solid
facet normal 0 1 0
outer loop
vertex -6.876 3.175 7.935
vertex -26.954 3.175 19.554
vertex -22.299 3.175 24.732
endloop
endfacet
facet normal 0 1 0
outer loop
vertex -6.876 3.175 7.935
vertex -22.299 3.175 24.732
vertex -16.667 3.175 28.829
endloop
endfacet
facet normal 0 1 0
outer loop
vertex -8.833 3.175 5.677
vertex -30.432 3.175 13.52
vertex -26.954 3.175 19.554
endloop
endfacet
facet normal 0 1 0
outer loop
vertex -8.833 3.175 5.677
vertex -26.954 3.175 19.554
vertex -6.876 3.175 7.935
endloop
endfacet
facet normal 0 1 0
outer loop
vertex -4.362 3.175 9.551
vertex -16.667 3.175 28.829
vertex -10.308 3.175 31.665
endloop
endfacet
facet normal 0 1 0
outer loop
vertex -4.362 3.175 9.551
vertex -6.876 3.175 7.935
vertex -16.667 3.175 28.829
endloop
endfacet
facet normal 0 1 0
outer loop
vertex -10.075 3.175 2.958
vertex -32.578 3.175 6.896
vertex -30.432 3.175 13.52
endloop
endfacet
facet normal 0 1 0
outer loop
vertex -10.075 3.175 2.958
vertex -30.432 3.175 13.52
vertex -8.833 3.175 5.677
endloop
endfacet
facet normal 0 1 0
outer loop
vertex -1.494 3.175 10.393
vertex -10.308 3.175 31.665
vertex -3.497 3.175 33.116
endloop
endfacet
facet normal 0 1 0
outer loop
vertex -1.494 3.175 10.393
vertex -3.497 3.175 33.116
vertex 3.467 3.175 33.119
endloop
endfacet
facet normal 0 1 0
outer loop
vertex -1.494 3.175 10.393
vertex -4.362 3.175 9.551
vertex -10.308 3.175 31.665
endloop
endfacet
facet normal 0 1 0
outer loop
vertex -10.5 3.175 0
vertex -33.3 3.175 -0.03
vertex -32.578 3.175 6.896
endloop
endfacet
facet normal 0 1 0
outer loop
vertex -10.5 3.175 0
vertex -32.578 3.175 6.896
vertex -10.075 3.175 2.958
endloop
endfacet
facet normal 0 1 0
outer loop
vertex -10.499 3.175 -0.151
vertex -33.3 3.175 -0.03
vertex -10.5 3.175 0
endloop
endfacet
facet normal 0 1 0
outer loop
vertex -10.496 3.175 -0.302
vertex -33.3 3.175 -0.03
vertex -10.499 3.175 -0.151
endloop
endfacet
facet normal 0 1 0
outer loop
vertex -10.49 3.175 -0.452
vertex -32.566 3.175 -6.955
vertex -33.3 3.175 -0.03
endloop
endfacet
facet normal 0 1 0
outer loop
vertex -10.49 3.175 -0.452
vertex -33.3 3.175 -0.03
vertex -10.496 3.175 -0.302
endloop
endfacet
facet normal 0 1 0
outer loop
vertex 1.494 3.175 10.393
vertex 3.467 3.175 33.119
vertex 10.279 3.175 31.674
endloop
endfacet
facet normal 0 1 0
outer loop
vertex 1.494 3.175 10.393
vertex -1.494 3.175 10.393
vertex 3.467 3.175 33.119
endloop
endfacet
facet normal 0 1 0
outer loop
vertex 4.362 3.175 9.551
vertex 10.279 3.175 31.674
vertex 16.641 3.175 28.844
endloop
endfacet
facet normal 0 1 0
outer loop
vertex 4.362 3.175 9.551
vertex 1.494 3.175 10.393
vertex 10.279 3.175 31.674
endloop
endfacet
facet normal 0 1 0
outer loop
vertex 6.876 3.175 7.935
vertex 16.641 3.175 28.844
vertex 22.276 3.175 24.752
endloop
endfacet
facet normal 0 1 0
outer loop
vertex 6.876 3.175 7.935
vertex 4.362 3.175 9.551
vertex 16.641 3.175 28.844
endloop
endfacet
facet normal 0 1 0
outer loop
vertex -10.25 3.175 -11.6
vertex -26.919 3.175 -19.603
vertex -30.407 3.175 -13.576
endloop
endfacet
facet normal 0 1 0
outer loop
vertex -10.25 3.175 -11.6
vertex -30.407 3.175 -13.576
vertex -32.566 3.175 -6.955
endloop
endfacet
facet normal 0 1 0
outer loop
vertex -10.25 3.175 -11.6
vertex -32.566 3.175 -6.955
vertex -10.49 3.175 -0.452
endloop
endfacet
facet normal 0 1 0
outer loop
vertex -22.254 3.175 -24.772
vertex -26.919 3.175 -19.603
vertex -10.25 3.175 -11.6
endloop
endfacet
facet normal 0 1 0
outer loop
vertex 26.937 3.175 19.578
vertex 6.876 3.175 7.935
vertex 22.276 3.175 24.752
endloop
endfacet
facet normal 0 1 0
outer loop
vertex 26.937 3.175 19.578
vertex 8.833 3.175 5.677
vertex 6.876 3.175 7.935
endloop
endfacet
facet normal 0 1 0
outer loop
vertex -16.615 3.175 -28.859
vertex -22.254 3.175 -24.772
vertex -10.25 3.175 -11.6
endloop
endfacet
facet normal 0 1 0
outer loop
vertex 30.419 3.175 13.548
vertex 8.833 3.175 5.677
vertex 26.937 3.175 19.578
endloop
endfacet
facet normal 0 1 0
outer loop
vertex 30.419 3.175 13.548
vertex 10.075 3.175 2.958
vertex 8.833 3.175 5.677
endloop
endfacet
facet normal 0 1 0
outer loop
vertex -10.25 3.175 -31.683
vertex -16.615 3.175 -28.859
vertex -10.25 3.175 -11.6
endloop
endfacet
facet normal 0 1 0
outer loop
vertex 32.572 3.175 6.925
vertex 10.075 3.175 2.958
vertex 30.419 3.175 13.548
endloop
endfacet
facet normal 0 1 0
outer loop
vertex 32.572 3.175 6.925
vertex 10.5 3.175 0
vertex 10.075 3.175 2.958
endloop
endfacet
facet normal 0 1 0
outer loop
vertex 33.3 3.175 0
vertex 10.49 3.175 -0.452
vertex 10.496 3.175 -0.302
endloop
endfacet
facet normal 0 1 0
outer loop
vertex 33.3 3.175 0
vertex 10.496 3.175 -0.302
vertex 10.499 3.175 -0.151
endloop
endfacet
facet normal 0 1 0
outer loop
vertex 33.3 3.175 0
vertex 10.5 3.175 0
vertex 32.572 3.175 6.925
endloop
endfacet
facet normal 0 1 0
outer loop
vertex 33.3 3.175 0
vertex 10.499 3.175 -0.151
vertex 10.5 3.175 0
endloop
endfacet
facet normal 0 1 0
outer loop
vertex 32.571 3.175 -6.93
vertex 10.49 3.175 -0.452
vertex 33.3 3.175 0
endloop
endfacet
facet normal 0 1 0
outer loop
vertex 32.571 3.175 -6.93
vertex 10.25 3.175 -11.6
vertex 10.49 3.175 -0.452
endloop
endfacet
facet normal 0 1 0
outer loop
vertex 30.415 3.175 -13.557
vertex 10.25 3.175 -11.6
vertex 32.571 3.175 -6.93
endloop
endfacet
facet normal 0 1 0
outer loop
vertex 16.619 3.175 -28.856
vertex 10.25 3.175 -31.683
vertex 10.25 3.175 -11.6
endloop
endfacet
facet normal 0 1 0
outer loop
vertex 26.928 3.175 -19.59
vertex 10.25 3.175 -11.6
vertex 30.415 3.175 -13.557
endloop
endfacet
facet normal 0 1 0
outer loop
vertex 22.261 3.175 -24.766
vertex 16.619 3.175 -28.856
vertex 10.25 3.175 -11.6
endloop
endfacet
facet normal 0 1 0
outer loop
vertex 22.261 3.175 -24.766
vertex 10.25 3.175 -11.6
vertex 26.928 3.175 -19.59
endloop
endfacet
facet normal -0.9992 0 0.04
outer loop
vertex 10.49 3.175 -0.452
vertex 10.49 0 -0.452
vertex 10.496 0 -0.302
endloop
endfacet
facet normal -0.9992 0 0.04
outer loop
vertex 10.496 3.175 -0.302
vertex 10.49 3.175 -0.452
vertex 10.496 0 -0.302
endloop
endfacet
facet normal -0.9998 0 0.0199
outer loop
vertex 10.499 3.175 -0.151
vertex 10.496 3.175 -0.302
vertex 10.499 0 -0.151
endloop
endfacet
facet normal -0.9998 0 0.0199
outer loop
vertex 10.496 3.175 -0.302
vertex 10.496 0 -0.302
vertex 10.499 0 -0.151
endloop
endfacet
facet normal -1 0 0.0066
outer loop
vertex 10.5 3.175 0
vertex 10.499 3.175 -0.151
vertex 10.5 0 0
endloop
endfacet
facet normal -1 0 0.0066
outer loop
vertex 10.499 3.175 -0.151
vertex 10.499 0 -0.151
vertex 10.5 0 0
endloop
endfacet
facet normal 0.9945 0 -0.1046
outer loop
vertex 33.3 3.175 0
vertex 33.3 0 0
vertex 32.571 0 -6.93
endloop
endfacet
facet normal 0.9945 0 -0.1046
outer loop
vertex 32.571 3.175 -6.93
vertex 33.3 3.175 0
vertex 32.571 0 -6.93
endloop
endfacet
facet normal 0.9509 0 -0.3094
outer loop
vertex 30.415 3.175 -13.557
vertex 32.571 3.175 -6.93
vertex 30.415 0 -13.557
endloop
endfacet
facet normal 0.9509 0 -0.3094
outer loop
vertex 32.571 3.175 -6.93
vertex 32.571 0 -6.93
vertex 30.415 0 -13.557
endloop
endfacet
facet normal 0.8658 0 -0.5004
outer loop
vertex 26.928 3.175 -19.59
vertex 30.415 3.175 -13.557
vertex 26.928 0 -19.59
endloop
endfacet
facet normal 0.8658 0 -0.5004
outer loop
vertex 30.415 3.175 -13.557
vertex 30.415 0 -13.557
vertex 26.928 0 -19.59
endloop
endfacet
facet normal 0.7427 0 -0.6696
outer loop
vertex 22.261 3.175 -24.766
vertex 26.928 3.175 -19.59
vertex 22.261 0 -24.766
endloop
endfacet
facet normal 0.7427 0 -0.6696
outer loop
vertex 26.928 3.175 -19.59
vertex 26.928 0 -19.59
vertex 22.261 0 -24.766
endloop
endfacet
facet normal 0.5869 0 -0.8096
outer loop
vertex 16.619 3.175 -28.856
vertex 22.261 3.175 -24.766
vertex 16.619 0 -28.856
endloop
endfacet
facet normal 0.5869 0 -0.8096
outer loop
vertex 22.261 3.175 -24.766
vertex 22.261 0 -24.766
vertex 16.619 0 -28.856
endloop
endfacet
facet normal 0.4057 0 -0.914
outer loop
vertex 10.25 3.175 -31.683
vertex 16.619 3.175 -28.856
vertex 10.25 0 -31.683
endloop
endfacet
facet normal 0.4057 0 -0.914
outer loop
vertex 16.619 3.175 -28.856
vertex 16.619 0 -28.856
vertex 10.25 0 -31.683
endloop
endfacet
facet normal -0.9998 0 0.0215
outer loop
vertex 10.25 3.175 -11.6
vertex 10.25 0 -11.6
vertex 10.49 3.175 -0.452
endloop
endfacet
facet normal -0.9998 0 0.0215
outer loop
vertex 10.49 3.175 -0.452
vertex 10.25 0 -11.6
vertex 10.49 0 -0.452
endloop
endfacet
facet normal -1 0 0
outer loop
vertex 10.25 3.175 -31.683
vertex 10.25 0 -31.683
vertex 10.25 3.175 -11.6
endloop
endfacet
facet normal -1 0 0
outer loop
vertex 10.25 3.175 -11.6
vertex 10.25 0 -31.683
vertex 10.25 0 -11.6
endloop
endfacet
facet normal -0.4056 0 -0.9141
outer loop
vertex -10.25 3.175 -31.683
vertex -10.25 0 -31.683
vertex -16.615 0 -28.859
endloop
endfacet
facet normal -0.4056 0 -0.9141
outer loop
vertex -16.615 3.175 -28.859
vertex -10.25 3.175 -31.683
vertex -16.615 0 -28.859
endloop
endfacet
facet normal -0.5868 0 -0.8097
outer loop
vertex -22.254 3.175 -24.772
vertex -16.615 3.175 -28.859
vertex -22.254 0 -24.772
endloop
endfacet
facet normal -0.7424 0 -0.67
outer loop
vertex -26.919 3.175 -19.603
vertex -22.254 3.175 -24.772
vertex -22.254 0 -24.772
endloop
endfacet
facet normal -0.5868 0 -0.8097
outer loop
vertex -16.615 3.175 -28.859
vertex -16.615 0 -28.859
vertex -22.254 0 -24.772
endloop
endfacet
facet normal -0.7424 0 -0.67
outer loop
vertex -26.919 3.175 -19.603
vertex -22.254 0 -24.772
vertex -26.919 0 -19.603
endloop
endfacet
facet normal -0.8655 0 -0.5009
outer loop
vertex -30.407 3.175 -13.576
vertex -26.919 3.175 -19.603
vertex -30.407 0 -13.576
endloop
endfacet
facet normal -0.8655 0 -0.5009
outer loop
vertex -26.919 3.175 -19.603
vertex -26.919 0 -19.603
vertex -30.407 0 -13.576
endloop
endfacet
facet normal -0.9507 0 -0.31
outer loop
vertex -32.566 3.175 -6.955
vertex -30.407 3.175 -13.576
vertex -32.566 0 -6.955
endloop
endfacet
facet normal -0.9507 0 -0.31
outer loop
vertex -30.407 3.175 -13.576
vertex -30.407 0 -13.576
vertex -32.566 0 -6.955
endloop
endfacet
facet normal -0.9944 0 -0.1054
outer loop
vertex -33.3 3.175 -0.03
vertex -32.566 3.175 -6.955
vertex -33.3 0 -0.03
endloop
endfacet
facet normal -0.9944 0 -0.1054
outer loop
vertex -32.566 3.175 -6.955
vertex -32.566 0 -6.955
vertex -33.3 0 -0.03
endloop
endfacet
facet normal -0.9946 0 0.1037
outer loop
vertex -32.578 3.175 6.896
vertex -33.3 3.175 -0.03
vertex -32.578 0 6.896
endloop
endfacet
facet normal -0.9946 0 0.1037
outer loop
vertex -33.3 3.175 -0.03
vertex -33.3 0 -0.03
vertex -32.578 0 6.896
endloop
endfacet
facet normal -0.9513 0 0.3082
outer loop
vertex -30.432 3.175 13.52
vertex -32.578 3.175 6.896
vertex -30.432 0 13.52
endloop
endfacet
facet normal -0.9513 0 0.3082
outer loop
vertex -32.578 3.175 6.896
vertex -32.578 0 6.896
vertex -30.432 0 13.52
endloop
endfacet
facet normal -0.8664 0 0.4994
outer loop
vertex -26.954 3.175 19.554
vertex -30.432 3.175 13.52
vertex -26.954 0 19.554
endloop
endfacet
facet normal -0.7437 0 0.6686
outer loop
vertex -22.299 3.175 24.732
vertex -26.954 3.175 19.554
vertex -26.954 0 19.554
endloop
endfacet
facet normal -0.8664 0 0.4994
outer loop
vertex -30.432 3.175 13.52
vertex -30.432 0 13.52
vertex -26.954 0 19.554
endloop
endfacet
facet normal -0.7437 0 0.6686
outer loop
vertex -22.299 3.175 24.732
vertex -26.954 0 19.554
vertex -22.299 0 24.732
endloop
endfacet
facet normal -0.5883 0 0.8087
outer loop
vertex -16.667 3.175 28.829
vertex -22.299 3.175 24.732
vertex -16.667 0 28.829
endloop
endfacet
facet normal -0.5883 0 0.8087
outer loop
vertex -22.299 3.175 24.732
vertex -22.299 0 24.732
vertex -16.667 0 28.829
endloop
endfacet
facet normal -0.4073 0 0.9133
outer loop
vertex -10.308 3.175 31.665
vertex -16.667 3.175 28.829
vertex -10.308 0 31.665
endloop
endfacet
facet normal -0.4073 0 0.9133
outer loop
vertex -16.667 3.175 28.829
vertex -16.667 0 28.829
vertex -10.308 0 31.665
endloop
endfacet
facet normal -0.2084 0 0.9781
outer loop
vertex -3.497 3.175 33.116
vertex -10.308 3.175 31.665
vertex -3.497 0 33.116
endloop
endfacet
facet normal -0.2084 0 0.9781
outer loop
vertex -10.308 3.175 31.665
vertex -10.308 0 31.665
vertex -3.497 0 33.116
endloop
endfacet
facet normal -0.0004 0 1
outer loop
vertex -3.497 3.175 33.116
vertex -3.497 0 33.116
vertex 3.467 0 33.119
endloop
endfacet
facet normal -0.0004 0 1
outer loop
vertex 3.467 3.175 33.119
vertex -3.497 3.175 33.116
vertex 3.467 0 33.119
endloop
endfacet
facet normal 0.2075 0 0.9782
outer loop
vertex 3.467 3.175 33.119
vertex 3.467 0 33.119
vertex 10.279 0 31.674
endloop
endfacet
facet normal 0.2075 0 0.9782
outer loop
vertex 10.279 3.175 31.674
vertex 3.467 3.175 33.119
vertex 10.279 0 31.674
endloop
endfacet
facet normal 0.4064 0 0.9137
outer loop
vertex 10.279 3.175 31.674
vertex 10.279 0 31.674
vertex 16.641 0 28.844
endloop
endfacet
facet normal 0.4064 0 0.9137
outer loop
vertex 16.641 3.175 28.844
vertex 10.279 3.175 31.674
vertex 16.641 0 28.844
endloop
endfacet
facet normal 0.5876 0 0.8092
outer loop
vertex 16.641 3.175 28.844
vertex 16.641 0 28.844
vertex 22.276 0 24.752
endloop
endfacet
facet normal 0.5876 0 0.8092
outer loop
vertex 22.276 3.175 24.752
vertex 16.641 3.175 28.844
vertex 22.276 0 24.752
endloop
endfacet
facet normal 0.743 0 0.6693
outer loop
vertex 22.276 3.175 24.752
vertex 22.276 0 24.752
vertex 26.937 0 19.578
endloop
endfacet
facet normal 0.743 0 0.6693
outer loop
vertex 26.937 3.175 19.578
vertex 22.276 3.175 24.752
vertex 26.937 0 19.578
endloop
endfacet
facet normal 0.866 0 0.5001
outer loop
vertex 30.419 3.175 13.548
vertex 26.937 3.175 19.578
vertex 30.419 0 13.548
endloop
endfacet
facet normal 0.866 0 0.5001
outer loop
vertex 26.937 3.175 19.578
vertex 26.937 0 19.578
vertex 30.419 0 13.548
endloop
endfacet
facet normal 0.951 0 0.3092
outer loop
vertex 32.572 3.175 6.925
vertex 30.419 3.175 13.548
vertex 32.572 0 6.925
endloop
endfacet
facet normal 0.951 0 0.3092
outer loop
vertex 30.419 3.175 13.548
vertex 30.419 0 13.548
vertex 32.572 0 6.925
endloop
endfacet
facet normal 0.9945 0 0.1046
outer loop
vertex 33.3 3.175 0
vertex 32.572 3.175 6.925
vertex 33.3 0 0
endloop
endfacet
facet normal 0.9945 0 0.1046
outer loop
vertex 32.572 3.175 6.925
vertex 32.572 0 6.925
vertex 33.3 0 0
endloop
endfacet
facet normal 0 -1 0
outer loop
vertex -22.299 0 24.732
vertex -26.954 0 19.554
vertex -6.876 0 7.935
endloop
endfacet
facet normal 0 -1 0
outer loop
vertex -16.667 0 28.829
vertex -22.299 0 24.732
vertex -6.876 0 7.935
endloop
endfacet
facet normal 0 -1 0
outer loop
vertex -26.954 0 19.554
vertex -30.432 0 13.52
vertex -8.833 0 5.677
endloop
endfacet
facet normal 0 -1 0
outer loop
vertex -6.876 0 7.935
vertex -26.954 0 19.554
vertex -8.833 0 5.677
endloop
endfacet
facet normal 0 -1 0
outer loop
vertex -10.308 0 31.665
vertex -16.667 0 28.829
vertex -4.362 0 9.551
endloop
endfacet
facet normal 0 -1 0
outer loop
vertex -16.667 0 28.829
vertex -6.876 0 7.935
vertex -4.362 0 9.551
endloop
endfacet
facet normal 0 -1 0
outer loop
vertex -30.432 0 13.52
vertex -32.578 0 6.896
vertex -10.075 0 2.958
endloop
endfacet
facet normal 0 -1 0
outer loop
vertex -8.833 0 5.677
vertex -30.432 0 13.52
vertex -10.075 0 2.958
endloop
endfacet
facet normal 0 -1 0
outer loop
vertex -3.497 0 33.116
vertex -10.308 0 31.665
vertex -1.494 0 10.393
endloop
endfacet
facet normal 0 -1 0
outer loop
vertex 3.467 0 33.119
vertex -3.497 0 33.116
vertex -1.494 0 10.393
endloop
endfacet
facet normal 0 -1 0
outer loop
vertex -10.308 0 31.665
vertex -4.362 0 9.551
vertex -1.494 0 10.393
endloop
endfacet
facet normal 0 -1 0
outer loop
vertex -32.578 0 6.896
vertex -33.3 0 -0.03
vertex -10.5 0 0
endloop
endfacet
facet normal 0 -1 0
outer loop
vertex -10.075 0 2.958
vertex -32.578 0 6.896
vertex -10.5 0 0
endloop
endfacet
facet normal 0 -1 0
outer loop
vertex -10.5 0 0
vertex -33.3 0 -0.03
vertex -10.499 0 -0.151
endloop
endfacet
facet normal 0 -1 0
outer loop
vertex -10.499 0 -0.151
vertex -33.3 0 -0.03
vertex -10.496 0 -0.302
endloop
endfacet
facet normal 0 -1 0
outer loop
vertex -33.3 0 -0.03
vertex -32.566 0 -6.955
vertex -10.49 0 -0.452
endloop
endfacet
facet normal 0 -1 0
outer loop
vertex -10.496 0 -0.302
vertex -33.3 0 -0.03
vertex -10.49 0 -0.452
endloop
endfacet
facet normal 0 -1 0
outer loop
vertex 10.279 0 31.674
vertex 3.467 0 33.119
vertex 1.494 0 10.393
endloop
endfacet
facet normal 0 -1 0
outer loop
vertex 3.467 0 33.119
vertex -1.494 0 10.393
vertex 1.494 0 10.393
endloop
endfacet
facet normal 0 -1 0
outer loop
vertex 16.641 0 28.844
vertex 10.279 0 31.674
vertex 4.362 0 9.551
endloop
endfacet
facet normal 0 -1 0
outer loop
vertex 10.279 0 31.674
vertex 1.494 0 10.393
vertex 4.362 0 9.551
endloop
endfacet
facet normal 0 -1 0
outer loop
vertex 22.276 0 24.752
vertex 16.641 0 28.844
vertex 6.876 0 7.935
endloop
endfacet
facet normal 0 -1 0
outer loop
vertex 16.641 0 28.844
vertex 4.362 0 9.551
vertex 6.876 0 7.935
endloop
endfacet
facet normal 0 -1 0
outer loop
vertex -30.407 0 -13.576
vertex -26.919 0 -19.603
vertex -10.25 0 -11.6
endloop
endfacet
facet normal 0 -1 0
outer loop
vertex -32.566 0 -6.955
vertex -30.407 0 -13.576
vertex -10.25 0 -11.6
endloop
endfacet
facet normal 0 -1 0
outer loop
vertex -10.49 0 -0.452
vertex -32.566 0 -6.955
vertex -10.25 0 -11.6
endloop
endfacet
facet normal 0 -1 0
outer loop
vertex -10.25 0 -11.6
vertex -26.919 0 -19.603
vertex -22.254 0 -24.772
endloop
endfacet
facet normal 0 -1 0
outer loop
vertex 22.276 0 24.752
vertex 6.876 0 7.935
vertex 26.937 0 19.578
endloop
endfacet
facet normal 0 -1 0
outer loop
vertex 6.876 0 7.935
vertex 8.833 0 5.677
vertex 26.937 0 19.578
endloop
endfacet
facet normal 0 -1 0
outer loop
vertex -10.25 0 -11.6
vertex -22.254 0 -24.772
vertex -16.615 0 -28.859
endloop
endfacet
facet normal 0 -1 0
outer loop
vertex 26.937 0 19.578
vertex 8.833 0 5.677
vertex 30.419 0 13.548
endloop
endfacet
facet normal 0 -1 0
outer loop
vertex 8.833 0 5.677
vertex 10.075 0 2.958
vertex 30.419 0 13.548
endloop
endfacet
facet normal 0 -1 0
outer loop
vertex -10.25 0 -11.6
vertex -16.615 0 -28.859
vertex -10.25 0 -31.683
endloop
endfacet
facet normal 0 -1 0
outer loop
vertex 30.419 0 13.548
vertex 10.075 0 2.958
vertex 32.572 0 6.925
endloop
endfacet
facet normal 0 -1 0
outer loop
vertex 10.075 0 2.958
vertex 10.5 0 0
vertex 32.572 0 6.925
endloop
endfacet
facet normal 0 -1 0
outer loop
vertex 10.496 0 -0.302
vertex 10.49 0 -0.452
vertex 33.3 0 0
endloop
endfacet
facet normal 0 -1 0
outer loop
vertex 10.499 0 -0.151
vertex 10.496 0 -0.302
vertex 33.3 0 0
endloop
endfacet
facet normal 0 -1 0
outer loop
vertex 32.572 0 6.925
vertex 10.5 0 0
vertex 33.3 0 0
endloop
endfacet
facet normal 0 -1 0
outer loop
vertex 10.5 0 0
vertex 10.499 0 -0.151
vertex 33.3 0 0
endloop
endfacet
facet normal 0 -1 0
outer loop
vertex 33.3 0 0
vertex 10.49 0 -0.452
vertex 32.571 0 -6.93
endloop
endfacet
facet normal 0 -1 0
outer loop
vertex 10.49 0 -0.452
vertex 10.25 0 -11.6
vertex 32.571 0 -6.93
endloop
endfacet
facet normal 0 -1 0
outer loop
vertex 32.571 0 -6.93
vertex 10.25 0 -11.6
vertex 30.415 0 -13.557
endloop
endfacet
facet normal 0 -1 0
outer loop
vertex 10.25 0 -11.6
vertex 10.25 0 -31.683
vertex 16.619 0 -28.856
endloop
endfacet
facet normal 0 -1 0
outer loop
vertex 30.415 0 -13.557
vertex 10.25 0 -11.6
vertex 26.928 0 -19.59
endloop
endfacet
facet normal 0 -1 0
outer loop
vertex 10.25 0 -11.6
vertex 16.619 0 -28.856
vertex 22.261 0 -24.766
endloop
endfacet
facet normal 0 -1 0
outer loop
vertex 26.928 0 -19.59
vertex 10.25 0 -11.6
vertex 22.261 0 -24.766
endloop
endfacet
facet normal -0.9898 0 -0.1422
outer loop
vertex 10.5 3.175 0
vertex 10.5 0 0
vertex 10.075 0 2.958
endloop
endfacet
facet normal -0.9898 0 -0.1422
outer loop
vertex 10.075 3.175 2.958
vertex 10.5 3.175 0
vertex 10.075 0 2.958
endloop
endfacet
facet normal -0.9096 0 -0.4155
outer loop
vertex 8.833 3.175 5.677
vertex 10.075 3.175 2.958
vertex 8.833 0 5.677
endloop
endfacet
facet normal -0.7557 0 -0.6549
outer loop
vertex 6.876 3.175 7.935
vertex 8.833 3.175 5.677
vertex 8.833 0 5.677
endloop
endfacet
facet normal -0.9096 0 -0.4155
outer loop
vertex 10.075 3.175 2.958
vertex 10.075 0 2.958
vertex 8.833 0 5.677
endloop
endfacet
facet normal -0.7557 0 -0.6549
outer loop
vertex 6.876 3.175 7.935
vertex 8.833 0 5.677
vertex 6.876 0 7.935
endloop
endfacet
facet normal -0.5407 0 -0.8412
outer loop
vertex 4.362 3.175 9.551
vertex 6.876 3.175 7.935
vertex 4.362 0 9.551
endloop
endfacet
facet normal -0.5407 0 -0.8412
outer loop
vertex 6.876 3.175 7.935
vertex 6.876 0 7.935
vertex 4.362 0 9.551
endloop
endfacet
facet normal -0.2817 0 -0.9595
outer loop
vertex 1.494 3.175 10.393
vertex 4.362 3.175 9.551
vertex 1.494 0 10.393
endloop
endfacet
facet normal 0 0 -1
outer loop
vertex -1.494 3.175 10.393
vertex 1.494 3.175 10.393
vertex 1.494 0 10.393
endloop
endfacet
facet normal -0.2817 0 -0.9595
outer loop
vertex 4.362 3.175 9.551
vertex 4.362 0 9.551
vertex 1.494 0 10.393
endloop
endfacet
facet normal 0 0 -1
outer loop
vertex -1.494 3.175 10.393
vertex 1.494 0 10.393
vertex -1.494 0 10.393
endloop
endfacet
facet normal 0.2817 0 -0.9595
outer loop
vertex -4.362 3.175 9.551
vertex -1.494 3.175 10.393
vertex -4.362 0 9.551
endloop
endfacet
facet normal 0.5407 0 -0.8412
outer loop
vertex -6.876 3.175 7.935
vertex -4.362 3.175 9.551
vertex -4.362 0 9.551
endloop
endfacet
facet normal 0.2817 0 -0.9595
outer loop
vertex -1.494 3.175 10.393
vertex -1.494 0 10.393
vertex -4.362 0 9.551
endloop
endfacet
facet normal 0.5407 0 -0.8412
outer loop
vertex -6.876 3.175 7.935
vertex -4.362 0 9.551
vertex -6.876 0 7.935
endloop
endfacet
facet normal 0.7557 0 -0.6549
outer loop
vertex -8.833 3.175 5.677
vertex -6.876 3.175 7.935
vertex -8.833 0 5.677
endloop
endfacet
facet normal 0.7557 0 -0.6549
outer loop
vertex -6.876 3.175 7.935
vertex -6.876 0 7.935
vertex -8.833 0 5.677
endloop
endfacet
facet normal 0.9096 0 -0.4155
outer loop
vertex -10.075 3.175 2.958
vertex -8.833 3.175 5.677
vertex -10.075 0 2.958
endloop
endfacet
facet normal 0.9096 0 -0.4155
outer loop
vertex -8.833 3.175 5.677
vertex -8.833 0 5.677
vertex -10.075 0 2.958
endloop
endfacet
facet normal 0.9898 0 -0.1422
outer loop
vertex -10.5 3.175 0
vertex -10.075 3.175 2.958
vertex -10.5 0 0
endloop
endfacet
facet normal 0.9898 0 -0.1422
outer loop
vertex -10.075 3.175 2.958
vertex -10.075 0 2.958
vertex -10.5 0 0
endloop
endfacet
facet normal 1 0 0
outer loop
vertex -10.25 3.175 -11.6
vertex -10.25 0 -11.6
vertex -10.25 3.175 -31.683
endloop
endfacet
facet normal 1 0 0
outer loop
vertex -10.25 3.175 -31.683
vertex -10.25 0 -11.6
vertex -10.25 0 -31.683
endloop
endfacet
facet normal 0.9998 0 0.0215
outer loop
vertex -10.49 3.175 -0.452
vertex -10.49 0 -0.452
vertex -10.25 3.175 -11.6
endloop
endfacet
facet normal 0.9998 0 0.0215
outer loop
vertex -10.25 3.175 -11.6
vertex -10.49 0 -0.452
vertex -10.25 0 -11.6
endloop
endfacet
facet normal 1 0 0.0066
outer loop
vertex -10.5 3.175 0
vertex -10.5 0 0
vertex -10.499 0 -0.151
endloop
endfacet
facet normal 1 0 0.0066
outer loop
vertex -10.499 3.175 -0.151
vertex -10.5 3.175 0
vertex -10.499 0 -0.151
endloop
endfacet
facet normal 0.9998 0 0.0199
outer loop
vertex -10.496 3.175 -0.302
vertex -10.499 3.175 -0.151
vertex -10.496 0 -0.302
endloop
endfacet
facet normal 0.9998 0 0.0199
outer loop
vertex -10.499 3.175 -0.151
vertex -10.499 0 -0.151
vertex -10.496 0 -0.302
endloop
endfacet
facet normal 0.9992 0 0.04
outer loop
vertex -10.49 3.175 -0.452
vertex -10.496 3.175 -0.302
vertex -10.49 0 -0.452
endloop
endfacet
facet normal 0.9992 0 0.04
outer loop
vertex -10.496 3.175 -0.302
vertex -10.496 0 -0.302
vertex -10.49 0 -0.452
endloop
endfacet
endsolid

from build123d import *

# Parameters (mm, degrees)
BOSS_EXTRUDE1_DEPTH = 3.175


with BuildPart() as part:
    # Sketch1 → Boss-Extrude1 (new body)
    with BuildSketch(Plane(origin=(0, 0, 0), x_dir=(1, 0, 0), z_dir=(0, 1, 0))):
        with BuildLine():
            Line((-10.25, 11.6), (-10.25, 31.683236893))
            ThreePointArc((-10.25, 31.683236893), (-19.590367531, -26.927820187), (33.3, 0))
            ThreePointArc((33.3, 0), (26.927820187, 19.590367531), (10.25, 31.683236893))
            Line((10.25, 31.683236893), (10.25, 11.6))
            Line((10.25, 11.6), (10.490250515, 0.452376089))
            ThreePointArc((10.490250515, 0.452376089), (10.497562346, 0.226240568), (10.5, 0))
            ThreePointArc((10.5, 0), (0, -10.5), (-10.5, 0))
            ThreePointArc((-10.5, 0), (-10.497562346, 0.226240568), (-10.490250515, 0.452376089))
            Line((-10.490250515, 0.452376089), (-10.25, 11.6))
        make_face()
    extrude(amount=BOSS_EXTRUDE1_DEPTH)


solid = part.part
